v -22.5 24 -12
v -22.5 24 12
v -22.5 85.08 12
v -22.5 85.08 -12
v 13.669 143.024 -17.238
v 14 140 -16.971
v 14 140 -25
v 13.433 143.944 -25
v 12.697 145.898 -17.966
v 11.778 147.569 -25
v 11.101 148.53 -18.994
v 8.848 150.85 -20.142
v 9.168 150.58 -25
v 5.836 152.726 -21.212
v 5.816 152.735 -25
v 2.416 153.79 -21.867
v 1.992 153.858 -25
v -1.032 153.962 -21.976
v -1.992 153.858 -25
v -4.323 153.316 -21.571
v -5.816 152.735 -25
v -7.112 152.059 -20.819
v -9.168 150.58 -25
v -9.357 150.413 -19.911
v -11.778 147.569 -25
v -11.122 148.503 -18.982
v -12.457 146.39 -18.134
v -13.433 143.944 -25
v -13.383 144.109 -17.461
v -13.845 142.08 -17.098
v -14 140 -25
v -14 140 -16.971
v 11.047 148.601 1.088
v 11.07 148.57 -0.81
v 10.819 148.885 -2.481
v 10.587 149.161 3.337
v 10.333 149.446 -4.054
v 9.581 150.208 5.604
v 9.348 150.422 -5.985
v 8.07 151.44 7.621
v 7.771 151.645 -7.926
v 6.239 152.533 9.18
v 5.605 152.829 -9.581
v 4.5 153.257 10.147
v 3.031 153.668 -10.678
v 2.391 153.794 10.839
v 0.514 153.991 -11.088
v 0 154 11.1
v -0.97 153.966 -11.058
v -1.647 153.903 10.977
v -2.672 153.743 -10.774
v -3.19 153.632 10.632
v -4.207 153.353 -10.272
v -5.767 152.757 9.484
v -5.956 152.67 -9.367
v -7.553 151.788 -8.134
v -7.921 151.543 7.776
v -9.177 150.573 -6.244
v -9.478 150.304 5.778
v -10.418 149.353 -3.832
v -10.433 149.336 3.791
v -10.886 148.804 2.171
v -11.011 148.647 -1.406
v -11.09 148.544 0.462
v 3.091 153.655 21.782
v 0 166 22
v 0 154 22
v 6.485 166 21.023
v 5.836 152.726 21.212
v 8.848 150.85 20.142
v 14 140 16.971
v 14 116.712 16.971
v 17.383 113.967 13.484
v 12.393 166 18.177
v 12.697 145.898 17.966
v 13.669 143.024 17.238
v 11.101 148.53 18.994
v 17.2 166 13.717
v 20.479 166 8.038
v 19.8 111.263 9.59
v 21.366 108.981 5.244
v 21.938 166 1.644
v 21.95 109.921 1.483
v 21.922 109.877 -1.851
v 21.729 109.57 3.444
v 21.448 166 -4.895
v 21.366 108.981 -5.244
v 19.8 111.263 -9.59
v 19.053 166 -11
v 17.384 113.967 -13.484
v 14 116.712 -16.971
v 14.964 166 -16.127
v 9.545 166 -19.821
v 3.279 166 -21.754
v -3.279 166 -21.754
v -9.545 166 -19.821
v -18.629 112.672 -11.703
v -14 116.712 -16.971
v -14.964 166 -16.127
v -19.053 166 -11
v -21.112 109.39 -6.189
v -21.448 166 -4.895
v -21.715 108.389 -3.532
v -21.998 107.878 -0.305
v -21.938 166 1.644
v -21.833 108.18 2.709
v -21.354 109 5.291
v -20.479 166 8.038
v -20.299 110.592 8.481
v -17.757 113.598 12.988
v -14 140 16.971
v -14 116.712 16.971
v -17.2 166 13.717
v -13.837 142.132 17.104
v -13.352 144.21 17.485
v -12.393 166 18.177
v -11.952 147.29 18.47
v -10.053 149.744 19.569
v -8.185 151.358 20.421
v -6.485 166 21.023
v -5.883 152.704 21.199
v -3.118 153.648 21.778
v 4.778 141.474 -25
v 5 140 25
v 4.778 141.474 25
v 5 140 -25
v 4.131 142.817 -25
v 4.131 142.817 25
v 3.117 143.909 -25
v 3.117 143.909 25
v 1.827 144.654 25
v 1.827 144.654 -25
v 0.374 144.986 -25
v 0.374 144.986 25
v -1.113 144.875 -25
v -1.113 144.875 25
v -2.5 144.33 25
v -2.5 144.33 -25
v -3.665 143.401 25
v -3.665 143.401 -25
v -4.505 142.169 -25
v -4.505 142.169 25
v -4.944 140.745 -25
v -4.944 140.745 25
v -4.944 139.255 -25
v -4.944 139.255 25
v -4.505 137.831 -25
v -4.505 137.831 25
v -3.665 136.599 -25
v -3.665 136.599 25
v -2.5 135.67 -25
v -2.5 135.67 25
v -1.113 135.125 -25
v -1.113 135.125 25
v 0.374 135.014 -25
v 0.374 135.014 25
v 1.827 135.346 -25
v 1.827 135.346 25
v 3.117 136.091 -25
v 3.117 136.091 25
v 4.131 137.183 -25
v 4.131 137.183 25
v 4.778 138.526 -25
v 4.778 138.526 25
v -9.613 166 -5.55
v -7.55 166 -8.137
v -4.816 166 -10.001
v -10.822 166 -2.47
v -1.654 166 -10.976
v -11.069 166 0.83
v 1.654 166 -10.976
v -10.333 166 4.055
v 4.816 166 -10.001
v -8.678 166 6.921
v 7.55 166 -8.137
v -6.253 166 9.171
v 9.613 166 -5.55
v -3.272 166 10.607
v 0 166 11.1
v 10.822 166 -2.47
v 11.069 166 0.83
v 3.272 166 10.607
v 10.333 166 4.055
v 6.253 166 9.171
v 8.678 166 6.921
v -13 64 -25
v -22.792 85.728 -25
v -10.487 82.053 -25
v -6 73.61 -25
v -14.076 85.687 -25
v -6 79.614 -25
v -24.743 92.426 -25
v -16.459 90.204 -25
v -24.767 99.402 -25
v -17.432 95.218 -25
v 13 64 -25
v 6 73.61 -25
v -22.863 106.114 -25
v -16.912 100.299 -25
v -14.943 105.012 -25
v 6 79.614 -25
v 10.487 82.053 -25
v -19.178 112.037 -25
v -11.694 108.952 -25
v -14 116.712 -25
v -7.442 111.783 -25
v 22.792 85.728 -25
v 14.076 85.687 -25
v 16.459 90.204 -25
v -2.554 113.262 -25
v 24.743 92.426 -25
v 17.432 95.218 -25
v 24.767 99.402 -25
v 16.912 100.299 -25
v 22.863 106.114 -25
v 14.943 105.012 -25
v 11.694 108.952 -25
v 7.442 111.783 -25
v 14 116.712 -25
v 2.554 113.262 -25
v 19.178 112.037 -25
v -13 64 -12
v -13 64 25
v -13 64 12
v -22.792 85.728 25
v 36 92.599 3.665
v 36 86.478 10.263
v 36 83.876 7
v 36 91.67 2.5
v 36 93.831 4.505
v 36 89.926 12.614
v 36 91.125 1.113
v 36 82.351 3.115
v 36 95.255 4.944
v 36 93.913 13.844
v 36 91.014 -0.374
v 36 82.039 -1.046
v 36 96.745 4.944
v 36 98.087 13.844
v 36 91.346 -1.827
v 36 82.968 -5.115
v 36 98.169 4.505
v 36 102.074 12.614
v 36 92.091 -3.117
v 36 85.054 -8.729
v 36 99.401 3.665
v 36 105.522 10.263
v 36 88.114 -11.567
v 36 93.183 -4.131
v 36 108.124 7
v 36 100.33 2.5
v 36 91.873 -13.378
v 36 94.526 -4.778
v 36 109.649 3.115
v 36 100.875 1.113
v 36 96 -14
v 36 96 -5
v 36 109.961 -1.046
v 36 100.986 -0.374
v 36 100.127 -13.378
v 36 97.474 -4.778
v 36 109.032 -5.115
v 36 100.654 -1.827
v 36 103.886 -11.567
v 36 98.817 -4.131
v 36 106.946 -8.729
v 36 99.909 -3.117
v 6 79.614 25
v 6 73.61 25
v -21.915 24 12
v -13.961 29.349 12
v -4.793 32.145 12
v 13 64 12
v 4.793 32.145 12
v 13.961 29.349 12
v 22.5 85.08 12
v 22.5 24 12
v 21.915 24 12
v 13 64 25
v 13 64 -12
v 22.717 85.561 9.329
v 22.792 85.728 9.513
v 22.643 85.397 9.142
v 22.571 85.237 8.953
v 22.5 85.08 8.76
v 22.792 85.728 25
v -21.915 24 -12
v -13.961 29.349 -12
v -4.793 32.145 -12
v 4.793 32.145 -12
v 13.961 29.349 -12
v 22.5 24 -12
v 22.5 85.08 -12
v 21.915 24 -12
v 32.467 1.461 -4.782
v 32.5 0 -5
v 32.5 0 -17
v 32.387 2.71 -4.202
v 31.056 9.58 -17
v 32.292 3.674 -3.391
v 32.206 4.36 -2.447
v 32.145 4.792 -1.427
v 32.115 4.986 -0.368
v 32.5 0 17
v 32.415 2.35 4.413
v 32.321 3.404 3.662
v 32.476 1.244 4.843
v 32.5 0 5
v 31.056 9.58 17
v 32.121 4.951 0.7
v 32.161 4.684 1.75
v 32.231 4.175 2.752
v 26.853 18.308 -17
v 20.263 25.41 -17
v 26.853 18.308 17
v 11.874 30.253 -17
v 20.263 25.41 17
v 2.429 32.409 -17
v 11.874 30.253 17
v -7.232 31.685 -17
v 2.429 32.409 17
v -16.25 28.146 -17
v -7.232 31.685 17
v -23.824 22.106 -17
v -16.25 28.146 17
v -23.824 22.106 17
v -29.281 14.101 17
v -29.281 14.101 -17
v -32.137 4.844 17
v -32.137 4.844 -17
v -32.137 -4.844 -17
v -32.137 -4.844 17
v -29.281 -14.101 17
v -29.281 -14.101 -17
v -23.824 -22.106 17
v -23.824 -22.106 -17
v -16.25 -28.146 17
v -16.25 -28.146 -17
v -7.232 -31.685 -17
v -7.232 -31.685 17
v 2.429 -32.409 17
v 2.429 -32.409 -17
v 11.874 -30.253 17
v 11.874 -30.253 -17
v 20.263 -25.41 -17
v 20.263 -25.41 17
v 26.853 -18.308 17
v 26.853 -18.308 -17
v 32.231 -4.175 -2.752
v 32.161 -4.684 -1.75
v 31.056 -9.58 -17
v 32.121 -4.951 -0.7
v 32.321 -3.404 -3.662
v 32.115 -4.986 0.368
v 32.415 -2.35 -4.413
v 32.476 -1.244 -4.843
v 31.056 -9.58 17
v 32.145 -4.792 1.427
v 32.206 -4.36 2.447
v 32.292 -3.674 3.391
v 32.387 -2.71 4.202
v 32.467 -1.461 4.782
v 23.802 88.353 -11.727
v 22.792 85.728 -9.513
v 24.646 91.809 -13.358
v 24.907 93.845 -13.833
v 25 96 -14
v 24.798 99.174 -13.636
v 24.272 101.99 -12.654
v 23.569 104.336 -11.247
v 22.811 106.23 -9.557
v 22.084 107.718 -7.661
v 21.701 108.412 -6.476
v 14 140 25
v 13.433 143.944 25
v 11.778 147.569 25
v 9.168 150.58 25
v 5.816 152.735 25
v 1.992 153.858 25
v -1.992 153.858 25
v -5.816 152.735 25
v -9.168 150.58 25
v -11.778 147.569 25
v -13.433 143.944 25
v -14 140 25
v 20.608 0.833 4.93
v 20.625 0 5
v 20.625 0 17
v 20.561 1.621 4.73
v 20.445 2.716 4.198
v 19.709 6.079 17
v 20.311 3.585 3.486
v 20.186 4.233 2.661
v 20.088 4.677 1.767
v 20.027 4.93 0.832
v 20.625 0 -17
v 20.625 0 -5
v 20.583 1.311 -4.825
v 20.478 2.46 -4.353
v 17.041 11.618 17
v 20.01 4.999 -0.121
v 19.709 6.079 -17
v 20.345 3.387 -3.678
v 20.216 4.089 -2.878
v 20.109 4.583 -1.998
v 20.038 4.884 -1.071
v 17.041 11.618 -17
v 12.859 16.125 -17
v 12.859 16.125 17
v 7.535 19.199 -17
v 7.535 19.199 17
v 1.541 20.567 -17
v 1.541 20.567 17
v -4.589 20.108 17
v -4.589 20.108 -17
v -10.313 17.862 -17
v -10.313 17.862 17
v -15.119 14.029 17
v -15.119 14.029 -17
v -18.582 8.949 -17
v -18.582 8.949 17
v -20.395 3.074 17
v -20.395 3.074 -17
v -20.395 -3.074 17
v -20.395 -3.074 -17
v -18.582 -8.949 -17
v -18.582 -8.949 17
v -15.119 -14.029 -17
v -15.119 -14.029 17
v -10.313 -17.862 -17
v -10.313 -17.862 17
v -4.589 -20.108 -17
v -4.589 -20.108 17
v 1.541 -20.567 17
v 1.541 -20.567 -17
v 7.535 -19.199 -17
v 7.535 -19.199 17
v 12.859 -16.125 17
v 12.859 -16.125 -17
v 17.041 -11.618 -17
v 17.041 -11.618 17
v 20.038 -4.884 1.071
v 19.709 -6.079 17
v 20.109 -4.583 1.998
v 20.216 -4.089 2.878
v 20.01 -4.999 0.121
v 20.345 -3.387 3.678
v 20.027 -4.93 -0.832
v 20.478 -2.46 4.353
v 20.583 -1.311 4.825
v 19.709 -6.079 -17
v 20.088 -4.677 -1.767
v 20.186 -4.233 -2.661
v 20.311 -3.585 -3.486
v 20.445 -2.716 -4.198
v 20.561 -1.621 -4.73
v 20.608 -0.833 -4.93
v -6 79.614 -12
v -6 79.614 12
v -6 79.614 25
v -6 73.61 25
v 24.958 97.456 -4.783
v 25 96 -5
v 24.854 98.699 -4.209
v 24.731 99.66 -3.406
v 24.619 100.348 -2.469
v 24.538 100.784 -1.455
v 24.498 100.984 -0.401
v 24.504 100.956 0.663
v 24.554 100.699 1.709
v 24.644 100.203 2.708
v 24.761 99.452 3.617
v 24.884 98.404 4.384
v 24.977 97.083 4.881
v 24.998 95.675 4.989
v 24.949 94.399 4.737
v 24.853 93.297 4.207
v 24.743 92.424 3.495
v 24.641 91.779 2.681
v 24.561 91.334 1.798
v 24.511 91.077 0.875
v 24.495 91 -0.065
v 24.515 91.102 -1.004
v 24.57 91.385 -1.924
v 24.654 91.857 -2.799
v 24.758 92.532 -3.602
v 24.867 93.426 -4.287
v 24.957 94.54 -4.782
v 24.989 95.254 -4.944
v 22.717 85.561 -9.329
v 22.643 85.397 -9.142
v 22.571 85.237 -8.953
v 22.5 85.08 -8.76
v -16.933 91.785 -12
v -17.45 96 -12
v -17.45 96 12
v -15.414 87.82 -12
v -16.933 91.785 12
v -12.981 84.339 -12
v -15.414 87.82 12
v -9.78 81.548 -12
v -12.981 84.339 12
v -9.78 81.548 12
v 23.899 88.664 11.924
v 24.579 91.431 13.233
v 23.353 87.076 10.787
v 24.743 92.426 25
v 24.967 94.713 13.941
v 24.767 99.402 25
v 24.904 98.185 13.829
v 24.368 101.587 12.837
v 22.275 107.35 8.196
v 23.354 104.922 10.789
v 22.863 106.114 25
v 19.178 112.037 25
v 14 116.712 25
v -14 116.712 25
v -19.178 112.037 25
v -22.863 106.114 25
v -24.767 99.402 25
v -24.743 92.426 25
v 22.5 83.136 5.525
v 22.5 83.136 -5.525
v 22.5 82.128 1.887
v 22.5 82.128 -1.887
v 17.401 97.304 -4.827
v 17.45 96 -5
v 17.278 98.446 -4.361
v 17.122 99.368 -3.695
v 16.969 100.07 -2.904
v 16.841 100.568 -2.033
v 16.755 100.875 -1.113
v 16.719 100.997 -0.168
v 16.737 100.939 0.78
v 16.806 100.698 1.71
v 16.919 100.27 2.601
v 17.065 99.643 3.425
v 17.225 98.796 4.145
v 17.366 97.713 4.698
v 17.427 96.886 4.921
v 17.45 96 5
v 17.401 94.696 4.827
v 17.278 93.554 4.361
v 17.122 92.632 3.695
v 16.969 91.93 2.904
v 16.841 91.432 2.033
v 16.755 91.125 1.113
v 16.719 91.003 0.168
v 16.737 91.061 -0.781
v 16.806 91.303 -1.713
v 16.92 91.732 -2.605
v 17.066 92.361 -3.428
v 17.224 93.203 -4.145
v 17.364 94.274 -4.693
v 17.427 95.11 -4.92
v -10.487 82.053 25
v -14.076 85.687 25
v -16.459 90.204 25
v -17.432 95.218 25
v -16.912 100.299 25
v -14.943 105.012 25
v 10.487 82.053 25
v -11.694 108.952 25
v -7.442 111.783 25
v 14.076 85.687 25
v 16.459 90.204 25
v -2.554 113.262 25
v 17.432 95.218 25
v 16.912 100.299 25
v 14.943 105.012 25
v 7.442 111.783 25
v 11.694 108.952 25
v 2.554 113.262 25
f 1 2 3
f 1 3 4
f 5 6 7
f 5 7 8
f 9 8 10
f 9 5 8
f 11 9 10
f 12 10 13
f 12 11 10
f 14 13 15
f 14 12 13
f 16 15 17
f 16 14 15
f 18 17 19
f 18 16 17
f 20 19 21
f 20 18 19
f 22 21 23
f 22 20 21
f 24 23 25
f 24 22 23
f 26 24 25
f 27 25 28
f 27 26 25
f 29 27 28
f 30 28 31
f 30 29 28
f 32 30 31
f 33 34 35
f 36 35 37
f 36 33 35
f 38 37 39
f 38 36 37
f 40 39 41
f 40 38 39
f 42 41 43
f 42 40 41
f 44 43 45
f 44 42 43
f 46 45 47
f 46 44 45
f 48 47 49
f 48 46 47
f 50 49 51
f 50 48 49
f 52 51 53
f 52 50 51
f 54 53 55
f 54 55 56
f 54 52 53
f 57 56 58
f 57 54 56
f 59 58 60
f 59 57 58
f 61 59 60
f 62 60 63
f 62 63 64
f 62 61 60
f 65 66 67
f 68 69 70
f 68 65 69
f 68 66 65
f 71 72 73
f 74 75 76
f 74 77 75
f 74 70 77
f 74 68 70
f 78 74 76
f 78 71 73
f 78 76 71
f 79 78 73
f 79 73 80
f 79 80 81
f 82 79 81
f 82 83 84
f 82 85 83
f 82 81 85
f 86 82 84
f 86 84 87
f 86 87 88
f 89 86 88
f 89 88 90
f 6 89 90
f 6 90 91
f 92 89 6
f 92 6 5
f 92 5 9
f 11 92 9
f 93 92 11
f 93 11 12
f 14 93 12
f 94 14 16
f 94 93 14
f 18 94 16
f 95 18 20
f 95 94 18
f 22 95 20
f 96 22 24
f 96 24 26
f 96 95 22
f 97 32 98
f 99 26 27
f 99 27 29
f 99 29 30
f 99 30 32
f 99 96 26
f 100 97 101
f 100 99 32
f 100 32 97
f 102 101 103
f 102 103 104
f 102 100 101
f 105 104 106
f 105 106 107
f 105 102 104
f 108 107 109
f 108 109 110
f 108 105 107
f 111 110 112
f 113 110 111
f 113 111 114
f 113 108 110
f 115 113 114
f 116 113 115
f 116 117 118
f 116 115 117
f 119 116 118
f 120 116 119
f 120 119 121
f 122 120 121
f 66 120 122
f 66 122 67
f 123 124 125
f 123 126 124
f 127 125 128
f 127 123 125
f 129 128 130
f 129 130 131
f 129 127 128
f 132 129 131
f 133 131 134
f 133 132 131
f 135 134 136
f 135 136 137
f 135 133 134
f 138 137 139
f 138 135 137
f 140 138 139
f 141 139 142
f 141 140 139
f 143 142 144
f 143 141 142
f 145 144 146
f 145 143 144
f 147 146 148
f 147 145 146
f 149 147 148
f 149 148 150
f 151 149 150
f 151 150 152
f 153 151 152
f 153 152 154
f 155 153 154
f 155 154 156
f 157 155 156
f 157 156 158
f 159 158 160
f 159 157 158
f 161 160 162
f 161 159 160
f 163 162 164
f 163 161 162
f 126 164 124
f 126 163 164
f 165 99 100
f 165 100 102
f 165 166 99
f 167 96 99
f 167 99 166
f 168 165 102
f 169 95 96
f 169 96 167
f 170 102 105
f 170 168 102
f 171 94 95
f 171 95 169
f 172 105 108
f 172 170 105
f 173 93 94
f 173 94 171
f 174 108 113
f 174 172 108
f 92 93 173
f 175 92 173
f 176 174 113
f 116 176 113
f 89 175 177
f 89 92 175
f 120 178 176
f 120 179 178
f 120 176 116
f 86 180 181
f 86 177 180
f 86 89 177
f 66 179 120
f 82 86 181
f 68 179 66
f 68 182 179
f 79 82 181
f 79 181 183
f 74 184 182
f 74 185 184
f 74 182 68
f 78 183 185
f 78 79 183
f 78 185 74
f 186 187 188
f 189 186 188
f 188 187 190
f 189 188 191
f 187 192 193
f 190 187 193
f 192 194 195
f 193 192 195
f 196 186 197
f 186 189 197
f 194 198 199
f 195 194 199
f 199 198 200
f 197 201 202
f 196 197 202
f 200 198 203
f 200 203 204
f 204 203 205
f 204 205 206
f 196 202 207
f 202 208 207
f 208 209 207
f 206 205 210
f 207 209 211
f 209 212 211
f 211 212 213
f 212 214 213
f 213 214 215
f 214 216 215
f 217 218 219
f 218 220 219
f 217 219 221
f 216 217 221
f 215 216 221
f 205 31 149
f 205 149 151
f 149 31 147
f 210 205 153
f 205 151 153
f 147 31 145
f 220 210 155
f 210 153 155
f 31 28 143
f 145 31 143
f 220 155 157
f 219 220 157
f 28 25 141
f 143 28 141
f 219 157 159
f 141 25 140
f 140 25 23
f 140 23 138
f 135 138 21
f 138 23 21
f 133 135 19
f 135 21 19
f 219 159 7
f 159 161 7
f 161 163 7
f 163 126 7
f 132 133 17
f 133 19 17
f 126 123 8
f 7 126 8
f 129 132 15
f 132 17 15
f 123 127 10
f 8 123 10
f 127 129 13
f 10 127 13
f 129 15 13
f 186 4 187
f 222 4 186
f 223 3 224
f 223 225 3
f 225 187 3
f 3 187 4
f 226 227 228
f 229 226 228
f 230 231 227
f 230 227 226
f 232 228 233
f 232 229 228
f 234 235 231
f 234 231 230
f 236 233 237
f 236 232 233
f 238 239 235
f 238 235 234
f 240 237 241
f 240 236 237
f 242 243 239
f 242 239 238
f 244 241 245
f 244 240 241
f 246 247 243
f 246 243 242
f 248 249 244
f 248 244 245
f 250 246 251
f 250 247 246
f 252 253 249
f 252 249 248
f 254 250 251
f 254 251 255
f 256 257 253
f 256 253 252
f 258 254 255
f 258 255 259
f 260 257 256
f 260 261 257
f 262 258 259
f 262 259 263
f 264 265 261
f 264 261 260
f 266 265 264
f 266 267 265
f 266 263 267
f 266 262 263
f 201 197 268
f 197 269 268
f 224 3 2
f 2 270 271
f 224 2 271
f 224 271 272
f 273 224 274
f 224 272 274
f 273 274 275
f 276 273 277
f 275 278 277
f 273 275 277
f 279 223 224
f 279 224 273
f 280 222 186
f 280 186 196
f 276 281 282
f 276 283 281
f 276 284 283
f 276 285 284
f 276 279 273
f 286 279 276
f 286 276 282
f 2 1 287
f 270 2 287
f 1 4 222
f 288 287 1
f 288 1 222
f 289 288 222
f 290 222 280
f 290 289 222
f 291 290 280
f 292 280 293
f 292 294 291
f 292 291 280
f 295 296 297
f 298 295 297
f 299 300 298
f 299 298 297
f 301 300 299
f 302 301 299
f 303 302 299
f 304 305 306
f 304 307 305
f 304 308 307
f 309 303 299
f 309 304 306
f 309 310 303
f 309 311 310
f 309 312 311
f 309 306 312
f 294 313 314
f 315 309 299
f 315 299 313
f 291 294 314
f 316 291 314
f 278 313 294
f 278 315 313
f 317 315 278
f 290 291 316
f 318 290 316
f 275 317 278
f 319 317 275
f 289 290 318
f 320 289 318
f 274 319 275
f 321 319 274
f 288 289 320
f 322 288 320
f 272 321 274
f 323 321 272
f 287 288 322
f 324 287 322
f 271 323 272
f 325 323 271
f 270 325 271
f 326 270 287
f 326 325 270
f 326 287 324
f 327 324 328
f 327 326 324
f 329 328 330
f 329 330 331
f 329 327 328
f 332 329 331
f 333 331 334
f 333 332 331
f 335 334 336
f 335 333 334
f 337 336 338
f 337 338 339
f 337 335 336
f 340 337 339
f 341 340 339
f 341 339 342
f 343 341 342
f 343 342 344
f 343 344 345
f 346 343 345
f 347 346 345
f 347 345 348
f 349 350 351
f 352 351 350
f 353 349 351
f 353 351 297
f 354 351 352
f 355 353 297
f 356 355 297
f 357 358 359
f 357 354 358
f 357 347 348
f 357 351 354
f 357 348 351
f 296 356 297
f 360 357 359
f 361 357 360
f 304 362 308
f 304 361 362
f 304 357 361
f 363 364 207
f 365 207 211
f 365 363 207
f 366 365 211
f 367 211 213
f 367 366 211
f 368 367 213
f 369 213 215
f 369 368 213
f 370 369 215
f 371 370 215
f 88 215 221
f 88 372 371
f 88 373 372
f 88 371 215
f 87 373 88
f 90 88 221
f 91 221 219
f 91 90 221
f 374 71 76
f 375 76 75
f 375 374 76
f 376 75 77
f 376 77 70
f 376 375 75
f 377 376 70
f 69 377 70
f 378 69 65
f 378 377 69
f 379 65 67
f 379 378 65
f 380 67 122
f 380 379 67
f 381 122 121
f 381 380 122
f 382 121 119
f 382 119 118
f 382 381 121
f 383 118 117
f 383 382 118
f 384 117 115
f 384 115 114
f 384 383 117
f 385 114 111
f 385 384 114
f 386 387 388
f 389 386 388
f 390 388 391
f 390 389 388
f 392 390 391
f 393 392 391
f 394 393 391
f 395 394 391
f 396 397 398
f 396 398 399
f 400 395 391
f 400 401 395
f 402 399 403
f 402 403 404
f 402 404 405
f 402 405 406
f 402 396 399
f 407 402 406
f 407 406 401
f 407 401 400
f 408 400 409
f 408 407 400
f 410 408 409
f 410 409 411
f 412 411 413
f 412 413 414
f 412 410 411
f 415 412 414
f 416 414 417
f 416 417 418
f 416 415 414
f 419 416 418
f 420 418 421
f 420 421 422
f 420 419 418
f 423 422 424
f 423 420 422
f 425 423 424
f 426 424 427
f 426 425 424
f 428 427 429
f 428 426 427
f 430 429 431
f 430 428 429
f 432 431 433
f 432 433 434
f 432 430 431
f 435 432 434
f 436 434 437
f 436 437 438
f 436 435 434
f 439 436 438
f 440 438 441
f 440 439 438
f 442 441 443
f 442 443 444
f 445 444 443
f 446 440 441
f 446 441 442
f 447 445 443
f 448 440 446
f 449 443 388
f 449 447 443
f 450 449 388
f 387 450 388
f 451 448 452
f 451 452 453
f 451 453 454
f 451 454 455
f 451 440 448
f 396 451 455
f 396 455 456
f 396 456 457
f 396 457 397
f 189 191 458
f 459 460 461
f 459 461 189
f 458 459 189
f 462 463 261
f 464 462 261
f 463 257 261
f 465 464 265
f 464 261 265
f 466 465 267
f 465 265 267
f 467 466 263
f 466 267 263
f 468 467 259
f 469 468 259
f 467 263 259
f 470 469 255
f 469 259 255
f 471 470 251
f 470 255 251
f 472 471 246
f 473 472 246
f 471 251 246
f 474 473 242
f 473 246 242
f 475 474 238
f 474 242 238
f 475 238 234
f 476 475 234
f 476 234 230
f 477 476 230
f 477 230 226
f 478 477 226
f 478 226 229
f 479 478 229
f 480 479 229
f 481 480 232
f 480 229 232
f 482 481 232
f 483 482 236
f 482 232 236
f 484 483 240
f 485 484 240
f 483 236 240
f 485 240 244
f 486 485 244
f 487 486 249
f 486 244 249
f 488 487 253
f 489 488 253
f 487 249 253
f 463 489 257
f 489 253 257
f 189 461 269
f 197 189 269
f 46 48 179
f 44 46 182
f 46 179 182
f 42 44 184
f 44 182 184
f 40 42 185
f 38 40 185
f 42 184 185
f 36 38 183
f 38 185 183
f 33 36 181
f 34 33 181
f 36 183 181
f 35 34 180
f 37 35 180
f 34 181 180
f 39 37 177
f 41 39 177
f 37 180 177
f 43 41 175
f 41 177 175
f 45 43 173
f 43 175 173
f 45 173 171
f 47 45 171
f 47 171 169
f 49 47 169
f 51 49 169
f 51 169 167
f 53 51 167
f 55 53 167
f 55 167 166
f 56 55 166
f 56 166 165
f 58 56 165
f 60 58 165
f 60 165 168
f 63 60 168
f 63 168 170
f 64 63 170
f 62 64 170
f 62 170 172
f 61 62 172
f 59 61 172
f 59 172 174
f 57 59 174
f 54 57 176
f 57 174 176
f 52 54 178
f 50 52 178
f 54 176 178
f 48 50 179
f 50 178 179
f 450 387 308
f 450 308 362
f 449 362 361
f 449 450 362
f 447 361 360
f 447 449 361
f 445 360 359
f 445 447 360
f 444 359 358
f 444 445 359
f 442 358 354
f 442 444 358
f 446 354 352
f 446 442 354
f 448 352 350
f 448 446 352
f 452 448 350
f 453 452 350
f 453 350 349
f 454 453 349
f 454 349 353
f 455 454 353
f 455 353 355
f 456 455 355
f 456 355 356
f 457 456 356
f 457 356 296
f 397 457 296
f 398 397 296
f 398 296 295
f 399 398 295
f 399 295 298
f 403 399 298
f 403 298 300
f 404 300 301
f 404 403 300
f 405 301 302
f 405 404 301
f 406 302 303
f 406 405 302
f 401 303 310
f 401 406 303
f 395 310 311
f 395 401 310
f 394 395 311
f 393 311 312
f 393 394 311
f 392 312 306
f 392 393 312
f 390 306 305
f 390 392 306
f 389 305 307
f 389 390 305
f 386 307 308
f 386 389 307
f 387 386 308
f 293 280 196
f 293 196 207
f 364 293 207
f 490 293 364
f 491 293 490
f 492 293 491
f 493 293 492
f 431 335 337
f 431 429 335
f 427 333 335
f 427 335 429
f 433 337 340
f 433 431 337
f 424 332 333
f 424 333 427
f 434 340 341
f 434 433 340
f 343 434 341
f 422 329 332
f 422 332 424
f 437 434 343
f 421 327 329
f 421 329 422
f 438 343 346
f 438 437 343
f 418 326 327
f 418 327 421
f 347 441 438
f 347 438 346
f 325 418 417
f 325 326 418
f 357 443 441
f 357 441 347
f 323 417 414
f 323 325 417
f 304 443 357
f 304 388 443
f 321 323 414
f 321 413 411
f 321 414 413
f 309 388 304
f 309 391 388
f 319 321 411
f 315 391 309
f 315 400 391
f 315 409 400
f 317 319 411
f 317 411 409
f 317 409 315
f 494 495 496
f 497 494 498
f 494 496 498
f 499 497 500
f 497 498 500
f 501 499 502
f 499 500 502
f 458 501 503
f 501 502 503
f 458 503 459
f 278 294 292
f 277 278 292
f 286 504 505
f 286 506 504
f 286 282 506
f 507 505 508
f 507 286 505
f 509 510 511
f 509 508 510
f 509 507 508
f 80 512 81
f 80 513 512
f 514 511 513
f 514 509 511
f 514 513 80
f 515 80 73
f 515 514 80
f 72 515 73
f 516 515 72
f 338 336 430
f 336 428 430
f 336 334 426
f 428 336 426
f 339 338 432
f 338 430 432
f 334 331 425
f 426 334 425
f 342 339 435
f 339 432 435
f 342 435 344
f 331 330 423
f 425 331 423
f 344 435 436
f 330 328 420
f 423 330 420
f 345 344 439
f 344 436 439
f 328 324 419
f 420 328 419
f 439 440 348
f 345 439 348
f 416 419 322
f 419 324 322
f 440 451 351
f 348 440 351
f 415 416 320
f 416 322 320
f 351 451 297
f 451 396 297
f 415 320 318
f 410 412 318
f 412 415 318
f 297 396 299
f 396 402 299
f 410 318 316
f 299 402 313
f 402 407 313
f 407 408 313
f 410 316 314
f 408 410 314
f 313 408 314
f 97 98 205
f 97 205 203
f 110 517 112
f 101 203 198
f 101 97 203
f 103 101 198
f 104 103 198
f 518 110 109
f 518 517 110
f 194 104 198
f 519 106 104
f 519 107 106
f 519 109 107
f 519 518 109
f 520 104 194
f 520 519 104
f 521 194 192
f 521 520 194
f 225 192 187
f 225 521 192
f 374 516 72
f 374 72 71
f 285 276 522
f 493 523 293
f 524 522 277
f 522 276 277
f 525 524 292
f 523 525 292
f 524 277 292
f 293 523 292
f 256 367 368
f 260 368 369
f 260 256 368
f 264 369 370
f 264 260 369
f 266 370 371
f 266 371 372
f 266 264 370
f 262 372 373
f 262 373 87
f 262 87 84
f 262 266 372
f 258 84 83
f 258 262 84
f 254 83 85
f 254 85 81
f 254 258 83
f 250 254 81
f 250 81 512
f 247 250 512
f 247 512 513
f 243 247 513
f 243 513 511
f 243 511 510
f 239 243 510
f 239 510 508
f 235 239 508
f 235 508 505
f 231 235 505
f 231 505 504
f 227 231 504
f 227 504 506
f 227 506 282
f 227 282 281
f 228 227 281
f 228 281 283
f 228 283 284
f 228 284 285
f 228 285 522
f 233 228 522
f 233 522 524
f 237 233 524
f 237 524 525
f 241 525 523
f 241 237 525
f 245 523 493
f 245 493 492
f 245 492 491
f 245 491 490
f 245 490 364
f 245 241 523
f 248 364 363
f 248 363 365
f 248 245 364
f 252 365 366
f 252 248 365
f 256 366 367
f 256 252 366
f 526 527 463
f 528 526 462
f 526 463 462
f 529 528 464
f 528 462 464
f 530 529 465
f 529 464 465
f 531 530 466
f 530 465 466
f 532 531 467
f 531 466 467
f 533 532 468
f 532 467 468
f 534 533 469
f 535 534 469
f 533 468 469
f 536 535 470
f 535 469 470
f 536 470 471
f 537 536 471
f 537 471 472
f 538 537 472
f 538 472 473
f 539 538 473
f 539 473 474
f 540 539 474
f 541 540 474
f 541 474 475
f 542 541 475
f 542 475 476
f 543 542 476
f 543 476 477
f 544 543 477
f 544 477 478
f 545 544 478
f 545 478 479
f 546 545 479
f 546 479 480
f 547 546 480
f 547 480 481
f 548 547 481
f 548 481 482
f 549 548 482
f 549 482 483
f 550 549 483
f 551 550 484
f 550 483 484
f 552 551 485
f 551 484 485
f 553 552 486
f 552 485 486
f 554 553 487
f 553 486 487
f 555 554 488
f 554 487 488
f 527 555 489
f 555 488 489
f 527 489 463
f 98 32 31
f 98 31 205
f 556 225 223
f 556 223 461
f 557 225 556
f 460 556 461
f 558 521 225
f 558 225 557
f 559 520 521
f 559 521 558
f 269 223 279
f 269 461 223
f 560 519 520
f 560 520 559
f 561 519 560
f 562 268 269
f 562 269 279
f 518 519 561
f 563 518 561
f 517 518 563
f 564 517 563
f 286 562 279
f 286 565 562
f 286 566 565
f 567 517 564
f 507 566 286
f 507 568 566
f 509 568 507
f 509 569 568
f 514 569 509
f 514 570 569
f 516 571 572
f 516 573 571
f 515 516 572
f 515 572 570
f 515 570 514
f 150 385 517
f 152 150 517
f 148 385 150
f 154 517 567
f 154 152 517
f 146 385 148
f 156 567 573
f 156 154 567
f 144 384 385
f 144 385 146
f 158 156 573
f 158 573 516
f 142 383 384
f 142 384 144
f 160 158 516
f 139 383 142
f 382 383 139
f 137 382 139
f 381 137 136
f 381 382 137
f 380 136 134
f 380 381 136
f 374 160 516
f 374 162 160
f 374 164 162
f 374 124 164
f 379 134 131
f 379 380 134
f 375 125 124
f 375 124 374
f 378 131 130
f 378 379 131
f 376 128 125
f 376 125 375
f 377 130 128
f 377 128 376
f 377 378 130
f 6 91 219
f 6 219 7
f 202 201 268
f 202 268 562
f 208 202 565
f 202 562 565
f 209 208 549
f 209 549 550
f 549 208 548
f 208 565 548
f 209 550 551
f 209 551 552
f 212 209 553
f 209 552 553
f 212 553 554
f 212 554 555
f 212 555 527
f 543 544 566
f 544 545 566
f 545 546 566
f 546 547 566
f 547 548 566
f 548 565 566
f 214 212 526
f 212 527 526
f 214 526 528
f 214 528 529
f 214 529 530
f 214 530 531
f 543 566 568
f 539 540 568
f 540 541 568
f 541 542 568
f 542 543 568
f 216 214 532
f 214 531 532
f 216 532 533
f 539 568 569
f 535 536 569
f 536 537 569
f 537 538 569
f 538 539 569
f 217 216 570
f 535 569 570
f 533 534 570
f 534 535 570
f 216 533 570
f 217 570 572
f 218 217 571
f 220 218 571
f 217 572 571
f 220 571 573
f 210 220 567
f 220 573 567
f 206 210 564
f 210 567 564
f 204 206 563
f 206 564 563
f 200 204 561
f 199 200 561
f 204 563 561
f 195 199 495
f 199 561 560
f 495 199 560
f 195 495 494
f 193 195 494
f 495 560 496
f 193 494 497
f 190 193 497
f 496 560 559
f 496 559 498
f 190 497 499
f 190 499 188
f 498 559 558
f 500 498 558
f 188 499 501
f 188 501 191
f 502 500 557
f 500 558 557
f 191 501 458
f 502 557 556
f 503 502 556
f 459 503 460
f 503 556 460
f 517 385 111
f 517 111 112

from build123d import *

# Parameters (mm, degrees)
SKETCH1_R           = 32.5
SKETCH1_R_2         = 20.625
BOSS_EXTRUDE1_DEPTH = 17
BOSS_EXTRUDE2_START = 24
SKETCH2_W           = 45
SKETCH2_H           = 24
BOSS_EXTRUDE2_DEPTH = 72
SKETCH4_R           = 5
CUT_EXTRUDE1_DEPTH  = 103.767942472
SKETCH7_R           = 5
BOSS_EXTRUDE3_DEPTH = 25
BOSS_EXTRUDE4_REACH = 204.691
SKETCH8_R           = 22
SKETCH8_R_2         = 11.1
BOSS_EXTRUDE5_REACH = 183.31
SKETCH10_R          = 14
SKETCH10_R_2        = 5
SKETCH14_R          = 5
CUT_EXTRUDE3_DEPTH  = 34
CUT_EXTRUDE4_REACH  = 175.842


with BuildPart() as part:
    # Sketch1 → Boss-Extrude1 (new, symmetric)
    with BuildSketch(Plane.XY):
        Circle(SKETCH1_R)
        Circle(SKETCH1_R_2, mode=Mode.SUBTRACT)
    extrude(amount=BOSS_EXTRUDE1_DEPTH, both=True)

    # Sketch2 → Boss-Extrude2 (add)
    with BuildSketch(Plane(origin=(0, 0, 0), x_dir=(1, 0, 0), z_dir=(0, 1, 0)).offset(BOSS_EXTRUDE2_START)):
        Rectangle(SKETCH2_W, SKETCH2_H)
    extrude(amount=BOSS_EXTRUDE2_DEPTH)

    # Sketch4 → Cut-Extrude1 (cut, through all)
    with BuildSketch(Plane(origin=(0, 0, 0), x_dir=(0, 0, -1), z_dir=(1, 0, 0))):
        with Locations(Location((0, 0, 0), (0, 0, 180))):
            Circle(SKETCH4_R)
    extrude(amount=CUT_EXTRUDE1_DEPTH, mode=Mode.SUBTRACT)

    # Sketch7 → Boss-Extrude3 (add, symmetric)
    with BuildSketch(Plane.XY):
        with BuildLine():
            Line((-13, 64), (13, 64))
            Line((13, 64), (22.792288735, 85.728117298))
            ThreePointArc((22.792288735, 85.728117298), (24.050431537, 102.824715589), (14, 116.712315177))
            Line((14, 116.712315177), (14, 140))
            ThreePointArc((14, 140), (0, 154), (-14, 140))
            Line((-14, 140), (-14, 116.712315177))
            ThreePointArc((-14, 116.712315177), (-24.050431537, 102.824715589), (-22.792288735, 85.728117298))
            Line((-22.792288735, 85.728117298), (-13, 64))
        make_face()
        with Locations((0, 140)):
            Circle(SKETCH7_R, mode=Mode.SUBTRACT)
        with BuildLine():
            Line((-6, 73.61), (6, 73.61))
            Line((6, 73.61), (6, 79.613954107))
            ThreePointArc((6, 79.613954107), (0, 113.45), (-6, 79.613954107))
            Line((-6, 79.613954107), (-6, 73.61))
        make_face(mode=Mode.SUBTRACT)
    extrude(amount=BOSS_EXTRUDE3_DEPTH, both=True)

    # Sketch8 → Boss-Extrude4 (add, up to next)
    with BuildSketch(Plane(origin=(0, 166, 0), x_dir=(1, 0, 0), z_dir=(0, 1, 0)), mode=Mode.PRIVATE) as boss_extrude4_sk1:
        with Locations(Location((0, 0, 0), (0, 0, 270))):
            Circle(SKETCH8_R)
        with Locations(Location((0, 0, 0), (0, 0, 270))):
            Circle(SKETCH8_R_2, mode=Mode.SUBTRACT)
    boss_extrude4_tool1 = extrude(boss_extrude4_sk1.sketch, amount=-BOSS_EXTRUDE4_REACH, mode=Mode.PRIVATE) - part.part
    add(boss_extrude4_tool1.solids().sort_by_distance((0, 166, -21.377746))[0])

    # Sketch10 → Boss-Extrude5 (add, up to next)
    with BuildSketch(Plane(origin=(36, 0, 0), x_dir=(0, 0, -1), z_dir=(1, 0, 0)), mode=Mode.PRIVATE) as boss_extrude5_sk1:
        with Locations((0, 96)):
            Circle(SKETCH10_R)
        with Locations((0, 96)):
            Circle(SKETCH10_R_2, mode=Mode.SUBTRACT)
    boss_extrude5_tool1 = extrude(boss_extrude5_sk1.sketch, amount=-BOSS_EXTRUDE5_REACH, mode=Mode.PRIVATE) - part.part
    add(boss_extrude5_tool1.solids().sort_by_distance((36, 96, 13.60402))[0])

    # Sketch14 → Cut-Extrude3 (cut)
    with BuildSketch(Plane(origin=(36, 0, 0), x_dir=(0, 0, -1), z_dir=(1, 0, 0))):
        with Locations((0, 96)):
            Circle(SKETCH14_R)
    extrude(amount=-CUT_EXTRUDE3_DEPTH, mode=Mode.SUBTRACT)

    # Sketch15 → Cut-Extrude4 (cut, up to next)
    with BuildSketch(Plane.XY.offset(12), mode=Mode.PRIVATE) as cut_extrude4_sk1:
        with BuildLine():
            Line((6, 73.61), (6, 79.613954107))
            ThreePointArc((6, 79.613954107), (14.303889331, 86.00493872), (17.45, 96))
            Line((17.45, 96), (-17.45, 96))
            ThreePointArc((-17.45, 96), (-14.303889331, 86.00493872), (-6, 79.613954107))
            Line((-6, 79.613954107), (-6, 73.61))
            Line((-6, 73.61), (6, 73.61))
        make_face()
    cut_extrude4_tool1 = extrude(cut_extrude4_sk1.sketch, amount=-CUT_EXTRUDE4_REACH, mode=Mode.PRIVATE) & part.part
    add(cut_extrude4_tool1.solids().sort_by_distance((0, 87.149335, 12))[0], mode=Mode.SUBTRACT)


solid = part.part
